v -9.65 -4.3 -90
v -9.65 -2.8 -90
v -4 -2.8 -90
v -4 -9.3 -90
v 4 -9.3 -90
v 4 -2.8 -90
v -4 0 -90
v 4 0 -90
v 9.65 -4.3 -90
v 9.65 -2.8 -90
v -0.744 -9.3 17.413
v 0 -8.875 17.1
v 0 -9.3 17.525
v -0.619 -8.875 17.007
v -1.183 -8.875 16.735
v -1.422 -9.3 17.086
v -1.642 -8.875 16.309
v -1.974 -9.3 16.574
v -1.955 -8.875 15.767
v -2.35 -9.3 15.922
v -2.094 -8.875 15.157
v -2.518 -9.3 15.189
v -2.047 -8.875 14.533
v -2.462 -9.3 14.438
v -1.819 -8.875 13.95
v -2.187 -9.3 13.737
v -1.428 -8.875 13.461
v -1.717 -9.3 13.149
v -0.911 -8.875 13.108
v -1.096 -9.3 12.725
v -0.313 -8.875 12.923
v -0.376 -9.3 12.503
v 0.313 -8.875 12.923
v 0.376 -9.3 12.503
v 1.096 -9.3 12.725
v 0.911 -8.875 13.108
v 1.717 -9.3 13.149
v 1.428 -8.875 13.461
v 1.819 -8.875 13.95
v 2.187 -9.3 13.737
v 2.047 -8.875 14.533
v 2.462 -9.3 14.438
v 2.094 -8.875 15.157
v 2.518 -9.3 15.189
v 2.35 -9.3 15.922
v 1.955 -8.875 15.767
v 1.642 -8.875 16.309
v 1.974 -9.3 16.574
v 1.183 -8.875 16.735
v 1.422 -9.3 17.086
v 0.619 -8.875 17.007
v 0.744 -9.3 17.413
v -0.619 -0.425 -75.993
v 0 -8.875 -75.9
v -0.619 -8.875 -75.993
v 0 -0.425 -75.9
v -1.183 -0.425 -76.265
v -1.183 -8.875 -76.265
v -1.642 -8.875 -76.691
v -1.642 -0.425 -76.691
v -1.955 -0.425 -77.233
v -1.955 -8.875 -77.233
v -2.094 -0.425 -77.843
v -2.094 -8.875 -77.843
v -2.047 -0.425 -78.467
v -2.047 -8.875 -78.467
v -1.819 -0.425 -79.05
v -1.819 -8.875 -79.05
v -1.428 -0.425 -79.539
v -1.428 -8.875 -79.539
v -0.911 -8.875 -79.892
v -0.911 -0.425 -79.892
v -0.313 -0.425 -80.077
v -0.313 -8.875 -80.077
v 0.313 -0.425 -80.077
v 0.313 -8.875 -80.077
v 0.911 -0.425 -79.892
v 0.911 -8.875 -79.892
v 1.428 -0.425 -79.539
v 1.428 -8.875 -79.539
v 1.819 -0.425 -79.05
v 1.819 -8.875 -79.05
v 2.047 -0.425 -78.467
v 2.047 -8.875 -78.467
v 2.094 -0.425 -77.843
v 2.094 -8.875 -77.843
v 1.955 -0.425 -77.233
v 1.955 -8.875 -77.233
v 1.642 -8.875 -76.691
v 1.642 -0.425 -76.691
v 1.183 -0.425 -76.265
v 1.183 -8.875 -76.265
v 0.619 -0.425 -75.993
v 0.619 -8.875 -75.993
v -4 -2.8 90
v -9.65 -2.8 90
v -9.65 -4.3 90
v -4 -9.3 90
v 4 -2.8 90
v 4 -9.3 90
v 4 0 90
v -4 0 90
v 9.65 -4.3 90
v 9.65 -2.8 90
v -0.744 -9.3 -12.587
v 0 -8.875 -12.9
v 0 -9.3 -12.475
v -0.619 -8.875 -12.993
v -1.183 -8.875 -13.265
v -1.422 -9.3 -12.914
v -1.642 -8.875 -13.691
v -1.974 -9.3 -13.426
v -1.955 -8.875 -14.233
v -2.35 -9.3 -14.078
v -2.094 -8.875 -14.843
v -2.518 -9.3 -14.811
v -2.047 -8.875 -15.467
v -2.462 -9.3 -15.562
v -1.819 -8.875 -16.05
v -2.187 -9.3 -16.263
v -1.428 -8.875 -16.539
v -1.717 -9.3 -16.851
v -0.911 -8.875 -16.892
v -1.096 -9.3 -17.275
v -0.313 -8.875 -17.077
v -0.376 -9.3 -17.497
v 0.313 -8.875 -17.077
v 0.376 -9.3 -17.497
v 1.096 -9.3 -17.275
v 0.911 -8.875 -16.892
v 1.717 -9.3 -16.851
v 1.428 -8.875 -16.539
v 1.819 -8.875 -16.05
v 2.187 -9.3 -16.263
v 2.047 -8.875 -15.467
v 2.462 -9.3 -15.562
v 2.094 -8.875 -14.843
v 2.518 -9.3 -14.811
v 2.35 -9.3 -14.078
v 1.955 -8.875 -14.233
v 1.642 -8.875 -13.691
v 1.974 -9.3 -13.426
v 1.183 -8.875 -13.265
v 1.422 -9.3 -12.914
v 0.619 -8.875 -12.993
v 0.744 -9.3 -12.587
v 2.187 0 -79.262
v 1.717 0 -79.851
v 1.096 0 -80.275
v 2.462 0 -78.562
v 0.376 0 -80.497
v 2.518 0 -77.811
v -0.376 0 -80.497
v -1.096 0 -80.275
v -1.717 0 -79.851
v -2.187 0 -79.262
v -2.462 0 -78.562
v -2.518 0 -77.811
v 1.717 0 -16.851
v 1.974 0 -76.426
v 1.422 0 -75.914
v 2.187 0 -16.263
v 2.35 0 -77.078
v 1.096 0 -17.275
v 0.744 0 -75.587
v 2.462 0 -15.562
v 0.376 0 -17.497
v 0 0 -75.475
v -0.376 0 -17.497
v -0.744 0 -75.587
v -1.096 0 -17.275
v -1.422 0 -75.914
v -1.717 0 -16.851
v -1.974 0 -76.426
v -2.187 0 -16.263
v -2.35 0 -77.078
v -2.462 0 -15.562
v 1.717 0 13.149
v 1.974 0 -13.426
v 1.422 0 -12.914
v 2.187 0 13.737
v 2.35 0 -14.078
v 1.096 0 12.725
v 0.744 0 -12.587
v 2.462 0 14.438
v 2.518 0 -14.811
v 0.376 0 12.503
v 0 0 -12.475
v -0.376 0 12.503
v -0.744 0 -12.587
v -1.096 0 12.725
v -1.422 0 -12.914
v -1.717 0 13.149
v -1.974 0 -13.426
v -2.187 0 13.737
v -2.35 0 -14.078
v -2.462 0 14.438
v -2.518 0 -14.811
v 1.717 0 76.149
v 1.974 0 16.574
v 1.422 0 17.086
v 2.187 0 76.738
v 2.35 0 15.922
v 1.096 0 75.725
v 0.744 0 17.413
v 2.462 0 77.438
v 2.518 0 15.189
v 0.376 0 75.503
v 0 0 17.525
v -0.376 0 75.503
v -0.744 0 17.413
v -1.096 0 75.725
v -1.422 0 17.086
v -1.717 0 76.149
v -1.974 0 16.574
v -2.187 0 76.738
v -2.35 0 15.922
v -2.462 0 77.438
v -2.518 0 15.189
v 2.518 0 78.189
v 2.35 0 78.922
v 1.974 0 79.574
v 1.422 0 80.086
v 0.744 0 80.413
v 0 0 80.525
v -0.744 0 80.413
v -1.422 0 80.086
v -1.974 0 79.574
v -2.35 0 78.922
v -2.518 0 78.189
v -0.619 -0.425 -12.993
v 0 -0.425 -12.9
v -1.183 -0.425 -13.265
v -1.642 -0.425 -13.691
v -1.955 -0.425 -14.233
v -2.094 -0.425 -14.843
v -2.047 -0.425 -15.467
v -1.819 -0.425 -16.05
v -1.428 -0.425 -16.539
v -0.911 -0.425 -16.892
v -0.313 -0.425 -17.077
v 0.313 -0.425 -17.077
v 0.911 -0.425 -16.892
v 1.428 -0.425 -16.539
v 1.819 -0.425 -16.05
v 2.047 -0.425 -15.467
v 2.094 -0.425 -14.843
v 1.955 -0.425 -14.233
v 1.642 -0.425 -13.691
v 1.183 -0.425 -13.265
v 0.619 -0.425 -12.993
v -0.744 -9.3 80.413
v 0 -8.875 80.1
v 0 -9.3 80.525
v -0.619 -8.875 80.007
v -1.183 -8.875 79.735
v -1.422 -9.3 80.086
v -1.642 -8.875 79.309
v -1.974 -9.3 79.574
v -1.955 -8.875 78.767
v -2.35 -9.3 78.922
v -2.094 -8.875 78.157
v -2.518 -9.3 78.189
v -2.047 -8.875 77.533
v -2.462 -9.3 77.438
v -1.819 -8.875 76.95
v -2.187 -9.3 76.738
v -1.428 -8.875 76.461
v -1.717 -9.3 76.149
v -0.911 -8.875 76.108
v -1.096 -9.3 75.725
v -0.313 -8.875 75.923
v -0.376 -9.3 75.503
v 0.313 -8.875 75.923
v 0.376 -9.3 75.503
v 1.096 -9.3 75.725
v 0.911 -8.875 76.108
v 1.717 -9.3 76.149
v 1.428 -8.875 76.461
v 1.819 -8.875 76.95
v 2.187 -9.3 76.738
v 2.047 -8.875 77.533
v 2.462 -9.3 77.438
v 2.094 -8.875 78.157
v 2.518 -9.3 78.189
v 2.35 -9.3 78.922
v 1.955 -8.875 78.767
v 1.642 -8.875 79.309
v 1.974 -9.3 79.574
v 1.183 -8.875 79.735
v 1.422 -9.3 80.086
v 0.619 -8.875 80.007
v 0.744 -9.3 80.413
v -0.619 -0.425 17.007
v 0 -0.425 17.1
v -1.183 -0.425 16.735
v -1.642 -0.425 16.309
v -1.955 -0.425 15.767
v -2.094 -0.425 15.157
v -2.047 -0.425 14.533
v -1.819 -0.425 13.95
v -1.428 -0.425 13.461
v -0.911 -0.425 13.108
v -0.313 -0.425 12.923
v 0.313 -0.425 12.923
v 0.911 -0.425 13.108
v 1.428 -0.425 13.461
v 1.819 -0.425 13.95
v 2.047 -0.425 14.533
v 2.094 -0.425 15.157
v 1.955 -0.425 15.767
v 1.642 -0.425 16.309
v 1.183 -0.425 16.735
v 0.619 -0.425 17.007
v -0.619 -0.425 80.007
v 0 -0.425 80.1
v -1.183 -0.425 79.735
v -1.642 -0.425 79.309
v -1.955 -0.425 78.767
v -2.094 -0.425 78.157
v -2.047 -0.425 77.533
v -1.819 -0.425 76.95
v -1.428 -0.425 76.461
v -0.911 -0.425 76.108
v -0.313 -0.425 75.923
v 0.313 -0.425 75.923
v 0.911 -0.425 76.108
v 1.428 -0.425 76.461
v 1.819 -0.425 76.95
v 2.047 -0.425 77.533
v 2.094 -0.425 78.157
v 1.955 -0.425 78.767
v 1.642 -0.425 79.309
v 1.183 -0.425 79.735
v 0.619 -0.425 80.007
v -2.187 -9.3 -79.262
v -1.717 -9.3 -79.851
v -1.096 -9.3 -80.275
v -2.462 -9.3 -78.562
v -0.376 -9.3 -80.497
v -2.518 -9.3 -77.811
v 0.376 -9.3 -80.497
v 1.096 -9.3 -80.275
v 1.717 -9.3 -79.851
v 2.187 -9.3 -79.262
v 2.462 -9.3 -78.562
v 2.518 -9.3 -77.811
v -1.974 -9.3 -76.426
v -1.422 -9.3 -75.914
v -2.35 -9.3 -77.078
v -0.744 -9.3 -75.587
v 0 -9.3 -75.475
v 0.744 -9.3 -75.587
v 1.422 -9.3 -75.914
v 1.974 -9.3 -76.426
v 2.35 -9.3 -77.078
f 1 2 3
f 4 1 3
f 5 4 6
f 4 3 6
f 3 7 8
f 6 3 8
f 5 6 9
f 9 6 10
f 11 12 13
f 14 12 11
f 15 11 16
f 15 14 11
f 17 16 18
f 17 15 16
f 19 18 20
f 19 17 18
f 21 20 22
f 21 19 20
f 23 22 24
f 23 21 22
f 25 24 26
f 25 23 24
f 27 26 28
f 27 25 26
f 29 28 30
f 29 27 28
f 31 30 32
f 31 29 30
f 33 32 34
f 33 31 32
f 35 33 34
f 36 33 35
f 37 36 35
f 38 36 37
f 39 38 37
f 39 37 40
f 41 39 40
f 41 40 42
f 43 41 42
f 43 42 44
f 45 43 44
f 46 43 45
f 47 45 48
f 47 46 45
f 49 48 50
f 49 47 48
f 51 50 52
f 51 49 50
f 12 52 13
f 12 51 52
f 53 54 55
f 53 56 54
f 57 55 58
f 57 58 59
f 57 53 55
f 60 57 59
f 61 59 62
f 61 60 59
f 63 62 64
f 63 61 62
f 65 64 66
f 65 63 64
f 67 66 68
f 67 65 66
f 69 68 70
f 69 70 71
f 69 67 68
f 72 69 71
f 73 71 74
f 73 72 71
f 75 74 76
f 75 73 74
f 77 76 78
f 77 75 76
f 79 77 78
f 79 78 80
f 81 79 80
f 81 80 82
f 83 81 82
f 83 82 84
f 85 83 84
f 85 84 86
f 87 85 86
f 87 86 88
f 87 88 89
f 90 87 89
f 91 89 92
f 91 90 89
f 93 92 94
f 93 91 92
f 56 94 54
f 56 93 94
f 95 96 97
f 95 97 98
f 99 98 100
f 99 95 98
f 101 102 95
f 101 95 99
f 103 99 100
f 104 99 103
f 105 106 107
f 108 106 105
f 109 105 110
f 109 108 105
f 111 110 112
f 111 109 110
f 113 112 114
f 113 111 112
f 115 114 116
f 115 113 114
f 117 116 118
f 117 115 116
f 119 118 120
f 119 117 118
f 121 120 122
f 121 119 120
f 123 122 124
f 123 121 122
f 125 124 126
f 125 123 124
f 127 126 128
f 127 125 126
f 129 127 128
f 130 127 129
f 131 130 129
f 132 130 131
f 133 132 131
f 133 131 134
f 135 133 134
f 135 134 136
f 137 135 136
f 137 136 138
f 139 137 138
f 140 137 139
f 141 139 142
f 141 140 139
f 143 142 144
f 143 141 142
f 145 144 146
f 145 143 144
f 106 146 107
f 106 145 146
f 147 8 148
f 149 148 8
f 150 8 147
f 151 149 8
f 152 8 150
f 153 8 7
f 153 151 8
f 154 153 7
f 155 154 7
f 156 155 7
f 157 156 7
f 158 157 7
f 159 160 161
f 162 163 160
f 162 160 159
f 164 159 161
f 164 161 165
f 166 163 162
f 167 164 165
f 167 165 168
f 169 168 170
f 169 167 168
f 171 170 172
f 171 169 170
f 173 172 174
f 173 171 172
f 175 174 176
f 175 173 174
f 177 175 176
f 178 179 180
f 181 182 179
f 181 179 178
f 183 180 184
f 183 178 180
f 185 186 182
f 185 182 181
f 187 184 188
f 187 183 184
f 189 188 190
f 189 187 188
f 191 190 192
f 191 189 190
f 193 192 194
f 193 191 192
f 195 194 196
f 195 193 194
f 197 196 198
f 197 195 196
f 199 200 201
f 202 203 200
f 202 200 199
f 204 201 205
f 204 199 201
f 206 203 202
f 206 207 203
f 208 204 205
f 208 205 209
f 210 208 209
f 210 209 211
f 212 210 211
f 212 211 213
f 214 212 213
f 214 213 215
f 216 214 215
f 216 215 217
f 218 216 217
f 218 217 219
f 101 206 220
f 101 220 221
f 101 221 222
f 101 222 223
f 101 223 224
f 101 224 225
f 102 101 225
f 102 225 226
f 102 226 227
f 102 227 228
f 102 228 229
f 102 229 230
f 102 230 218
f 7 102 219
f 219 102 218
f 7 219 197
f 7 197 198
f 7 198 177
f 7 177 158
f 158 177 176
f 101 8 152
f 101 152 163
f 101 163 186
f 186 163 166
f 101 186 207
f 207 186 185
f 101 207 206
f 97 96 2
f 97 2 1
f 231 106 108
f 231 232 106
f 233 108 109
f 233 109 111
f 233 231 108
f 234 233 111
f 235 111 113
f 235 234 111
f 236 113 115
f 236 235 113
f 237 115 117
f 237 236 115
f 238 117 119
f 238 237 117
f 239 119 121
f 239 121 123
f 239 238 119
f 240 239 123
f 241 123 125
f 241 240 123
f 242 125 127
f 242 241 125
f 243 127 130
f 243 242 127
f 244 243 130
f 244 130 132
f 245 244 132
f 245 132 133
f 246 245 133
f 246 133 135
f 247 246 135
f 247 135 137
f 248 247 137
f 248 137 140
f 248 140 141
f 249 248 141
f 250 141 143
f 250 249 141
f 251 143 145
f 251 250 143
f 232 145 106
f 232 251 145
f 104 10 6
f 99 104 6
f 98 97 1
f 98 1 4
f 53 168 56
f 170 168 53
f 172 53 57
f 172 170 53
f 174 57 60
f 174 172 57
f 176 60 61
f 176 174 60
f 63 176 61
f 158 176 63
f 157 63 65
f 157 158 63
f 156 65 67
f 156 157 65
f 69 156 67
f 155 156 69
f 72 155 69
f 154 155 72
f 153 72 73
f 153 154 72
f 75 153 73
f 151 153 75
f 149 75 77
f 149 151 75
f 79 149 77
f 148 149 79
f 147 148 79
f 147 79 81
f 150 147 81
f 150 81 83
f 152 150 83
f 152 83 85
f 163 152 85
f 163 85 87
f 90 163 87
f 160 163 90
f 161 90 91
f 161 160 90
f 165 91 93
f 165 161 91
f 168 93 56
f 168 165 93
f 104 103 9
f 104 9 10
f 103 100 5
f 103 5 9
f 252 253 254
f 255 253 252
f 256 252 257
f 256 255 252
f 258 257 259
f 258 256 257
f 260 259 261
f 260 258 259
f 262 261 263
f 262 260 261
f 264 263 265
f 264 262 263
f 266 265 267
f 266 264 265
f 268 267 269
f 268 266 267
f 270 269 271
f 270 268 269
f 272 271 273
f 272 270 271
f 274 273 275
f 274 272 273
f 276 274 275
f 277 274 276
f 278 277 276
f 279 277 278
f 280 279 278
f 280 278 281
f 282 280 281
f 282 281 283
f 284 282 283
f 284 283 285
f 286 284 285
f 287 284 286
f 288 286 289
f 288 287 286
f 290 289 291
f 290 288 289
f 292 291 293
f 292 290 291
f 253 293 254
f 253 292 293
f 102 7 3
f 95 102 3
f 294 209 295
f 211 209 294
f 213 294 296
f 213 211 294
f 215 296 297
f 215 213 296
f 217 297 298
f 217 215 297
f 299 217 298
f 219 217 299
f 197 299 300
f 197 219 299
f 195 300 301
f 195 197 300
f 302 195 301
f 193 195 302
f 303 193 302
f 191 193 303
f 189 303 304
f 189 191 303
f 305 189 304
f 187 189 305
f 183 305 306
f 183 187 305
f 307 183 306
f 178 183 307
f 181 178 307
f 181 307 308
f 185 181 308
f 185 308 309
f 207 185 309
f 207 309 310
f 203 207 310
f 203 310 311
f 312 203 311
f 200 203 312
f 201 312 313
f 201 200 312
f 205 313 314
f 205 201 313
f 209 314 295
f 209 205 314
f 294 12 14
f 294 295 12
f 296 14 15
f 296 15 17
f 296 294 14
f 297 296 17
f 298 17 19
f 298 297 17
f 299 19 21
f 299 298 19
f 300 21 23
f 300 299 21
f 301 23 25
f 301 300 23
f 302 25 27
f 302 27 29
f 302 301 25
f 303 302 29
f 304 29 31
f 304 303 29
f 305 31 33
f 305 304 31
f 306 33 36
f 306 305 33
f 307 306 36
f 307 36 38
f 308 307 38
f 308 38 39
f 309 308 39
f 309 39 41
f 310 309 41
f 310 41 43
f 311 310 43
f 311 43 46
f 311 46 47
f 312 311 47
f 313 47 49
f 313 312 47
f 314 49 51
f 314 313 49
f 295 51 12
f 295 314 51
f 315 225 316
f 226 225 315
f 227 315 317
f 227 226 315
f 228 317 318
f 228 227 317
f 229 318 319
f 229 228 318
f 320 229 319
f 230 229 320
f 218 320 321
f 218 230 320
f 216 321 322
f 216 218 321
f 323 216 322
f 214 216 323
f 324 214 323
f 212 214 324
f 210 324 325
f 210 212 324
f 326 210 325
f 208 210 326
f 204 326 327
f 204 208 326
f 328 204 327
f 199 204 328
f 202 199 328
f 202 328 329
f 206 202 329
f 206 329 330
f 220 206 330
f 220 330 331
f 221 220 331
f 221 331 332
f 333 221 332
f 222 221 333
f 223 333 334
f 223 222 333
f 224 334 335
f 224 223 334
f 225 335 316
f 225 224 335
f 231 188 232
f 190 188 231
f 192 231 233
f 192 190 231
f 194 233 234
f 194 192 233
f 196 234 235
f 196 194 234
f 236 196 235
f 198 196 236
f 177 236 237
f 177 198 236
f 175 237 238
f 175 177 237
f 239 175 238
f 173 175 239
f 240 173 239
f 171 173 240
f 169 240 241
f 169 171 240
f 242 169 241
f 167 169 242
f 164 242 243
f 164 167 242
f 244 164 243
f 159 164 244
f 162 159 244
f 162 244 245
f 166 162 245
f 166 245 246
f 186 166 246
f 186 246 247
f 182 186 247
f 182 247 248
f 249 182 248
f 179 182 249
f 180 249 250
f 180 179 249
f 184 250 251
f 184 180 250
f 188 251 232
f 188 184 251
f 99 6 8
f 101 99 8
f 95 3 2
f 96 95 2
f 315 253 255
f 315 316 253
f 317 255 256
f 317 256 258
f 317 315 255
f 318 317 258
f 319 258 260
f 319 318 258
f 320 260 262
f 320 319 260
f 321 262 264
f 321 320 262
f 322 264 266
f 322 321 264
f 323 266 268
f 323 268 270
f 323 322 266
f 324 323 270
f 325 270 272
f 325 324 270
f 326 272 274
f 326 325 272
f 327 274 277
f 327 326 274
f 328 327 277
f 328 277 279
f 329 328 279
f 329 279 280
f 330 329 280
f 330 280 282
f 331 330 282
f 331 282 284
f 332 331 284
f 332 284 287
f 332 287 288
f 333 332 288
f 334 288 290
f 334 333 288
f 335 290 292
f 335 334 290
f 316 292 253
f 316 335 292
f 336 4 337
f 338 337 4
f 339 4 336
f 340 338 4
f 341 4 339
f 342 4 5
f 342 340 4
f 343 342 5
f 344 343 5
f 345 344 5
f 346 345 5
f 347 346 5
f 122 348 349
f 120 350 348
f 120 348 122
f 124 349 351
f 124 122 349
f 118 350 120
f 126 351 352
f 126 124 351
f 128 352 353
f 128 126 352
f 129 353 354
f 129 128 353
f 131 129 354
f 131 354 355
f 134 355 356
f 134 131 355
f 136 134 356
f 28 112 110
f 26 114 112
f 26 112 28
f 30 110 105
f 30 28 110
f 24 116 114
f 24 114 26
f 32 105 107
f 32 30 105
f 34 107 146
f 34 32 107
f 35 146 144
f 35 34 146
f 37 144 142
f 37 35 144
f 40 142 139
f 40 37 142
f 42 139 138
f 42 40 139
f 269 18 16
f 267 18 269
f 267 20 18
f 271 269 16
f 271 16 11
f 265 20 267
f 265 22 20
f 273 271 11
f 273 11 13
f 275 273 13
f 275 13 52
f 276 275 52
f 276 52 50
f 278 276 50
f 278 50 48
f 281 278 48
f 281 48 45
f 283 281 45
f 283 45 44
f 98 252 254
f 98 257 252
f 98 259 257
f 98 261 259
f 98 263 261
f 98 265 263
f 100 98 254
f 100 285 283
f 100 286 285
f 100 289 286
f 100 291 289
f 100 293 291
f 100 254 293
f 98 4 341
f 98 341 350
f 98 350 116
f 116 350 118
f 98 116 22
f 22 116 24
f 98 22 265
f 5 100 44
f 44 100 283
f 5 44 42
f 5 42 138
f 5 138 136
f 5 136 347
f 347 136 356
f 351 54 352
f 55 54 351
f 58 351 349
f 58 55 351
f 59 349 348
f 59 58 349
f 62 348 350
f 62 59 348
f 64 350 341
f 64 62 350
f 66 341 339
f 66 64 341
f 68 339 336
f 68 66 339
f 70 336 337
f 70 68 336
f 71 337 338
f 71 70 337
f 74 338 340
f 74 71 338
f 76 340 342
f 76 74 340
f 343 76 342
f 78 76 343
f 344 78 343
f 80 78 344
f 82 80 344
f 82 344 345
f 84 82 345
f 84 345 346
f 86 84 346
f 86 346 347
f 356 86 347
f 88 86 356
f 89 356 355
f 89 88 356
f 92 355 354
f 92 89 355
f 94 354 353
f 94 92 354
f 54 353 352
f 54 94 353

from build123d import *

# Parameters (mm, degrees)
EXTRUDE_1_DEPTH            = 90
HOLE_WIZARD_M52_AT_2_COUNT = 2
HOLE_WIZARD_M52_AT_2_PITCH = 63
HOLE_WIZARD_M52_AT_3_COUNT = 2
HOLE_WIZARD_M52_AT_3_PITCH = 93
HOLE_WIZARD_M52_AT_4_COUNT = 2
HOLE_WIZARD_M52_AT_4_PITCH = 156


with BuildPart() as part:
    # Эскиз1 → Бобышка-Вытянуть1 (new body, symmetric)
    with BuildSketch(Plane.XY):
        Polygon((4, 0), (-4, 0), (-4, -2.8), (-9.65, -2.8), (-9.65, -4.3), (-4, -9.3), (4, -9.3), (9.65, -4.3), (9.65, -2.8), (4, -2.8), align=None)
    extrude(amount=EXTRUDE_1_DEPTH, both=True)

    # Эскиз6 → Отверстие обработанное метчиком M52 (revolve, cut)
    with BuildSketch(Plane(origin=(0, 0, -78), x_dir=(0, 0, 1), z_dir=(1, 0, 0))):
        Polygon((0, 0), (0, 9.3), (2.525, 9.3), (2.1, 8.875), (2.1, 0.425), (2.525, 0), align=None)
    hole_wizard_m52 = revolve(axis=Axis((0, 6.35, -78), (0, -1, 0)), mode=Mode.SUBTRACT)

    # Отверстие обработанное метчиком M52 at 2: Отверстие обработанное метчиком M52 ×2
    with Locations(*[(0, 0, i * HOLE_WIZARD_M52_AT_2_PITCH) for i in range(1, HOLE_WIZARD_M52_AT_2_COUNT)]):
        add(hole_wizard_m52, mode=Mode.SUBTRACT)

    # Отверстие обработанное метчиком M52 at 3: Отверстие обработанное метчиком M52 ×2
    with Locations(*[(0, 0, i * HOLE_WIZARD_M52_AT_3_PITCH) for i in range(1, HOLE_WIZARD_M52_AT_3_COUNT)]):
        add(hole_wizard_m52, mode=Mode.SUBTRACT)

    # Отверстие обработанное метчиком M52 at 4: Отверстие обработанное метчиком M52 ×2
    with Locations(*[(0, 0, i * HOLE_WIZARD_M52_AT_4_PITCH) for i in range(1, HOLE_WIZARD_M52_AT_4_COUNT)]):
        add(hole_wizard_m52, mode=Mode.SUBTRACT)


solid = part.part
